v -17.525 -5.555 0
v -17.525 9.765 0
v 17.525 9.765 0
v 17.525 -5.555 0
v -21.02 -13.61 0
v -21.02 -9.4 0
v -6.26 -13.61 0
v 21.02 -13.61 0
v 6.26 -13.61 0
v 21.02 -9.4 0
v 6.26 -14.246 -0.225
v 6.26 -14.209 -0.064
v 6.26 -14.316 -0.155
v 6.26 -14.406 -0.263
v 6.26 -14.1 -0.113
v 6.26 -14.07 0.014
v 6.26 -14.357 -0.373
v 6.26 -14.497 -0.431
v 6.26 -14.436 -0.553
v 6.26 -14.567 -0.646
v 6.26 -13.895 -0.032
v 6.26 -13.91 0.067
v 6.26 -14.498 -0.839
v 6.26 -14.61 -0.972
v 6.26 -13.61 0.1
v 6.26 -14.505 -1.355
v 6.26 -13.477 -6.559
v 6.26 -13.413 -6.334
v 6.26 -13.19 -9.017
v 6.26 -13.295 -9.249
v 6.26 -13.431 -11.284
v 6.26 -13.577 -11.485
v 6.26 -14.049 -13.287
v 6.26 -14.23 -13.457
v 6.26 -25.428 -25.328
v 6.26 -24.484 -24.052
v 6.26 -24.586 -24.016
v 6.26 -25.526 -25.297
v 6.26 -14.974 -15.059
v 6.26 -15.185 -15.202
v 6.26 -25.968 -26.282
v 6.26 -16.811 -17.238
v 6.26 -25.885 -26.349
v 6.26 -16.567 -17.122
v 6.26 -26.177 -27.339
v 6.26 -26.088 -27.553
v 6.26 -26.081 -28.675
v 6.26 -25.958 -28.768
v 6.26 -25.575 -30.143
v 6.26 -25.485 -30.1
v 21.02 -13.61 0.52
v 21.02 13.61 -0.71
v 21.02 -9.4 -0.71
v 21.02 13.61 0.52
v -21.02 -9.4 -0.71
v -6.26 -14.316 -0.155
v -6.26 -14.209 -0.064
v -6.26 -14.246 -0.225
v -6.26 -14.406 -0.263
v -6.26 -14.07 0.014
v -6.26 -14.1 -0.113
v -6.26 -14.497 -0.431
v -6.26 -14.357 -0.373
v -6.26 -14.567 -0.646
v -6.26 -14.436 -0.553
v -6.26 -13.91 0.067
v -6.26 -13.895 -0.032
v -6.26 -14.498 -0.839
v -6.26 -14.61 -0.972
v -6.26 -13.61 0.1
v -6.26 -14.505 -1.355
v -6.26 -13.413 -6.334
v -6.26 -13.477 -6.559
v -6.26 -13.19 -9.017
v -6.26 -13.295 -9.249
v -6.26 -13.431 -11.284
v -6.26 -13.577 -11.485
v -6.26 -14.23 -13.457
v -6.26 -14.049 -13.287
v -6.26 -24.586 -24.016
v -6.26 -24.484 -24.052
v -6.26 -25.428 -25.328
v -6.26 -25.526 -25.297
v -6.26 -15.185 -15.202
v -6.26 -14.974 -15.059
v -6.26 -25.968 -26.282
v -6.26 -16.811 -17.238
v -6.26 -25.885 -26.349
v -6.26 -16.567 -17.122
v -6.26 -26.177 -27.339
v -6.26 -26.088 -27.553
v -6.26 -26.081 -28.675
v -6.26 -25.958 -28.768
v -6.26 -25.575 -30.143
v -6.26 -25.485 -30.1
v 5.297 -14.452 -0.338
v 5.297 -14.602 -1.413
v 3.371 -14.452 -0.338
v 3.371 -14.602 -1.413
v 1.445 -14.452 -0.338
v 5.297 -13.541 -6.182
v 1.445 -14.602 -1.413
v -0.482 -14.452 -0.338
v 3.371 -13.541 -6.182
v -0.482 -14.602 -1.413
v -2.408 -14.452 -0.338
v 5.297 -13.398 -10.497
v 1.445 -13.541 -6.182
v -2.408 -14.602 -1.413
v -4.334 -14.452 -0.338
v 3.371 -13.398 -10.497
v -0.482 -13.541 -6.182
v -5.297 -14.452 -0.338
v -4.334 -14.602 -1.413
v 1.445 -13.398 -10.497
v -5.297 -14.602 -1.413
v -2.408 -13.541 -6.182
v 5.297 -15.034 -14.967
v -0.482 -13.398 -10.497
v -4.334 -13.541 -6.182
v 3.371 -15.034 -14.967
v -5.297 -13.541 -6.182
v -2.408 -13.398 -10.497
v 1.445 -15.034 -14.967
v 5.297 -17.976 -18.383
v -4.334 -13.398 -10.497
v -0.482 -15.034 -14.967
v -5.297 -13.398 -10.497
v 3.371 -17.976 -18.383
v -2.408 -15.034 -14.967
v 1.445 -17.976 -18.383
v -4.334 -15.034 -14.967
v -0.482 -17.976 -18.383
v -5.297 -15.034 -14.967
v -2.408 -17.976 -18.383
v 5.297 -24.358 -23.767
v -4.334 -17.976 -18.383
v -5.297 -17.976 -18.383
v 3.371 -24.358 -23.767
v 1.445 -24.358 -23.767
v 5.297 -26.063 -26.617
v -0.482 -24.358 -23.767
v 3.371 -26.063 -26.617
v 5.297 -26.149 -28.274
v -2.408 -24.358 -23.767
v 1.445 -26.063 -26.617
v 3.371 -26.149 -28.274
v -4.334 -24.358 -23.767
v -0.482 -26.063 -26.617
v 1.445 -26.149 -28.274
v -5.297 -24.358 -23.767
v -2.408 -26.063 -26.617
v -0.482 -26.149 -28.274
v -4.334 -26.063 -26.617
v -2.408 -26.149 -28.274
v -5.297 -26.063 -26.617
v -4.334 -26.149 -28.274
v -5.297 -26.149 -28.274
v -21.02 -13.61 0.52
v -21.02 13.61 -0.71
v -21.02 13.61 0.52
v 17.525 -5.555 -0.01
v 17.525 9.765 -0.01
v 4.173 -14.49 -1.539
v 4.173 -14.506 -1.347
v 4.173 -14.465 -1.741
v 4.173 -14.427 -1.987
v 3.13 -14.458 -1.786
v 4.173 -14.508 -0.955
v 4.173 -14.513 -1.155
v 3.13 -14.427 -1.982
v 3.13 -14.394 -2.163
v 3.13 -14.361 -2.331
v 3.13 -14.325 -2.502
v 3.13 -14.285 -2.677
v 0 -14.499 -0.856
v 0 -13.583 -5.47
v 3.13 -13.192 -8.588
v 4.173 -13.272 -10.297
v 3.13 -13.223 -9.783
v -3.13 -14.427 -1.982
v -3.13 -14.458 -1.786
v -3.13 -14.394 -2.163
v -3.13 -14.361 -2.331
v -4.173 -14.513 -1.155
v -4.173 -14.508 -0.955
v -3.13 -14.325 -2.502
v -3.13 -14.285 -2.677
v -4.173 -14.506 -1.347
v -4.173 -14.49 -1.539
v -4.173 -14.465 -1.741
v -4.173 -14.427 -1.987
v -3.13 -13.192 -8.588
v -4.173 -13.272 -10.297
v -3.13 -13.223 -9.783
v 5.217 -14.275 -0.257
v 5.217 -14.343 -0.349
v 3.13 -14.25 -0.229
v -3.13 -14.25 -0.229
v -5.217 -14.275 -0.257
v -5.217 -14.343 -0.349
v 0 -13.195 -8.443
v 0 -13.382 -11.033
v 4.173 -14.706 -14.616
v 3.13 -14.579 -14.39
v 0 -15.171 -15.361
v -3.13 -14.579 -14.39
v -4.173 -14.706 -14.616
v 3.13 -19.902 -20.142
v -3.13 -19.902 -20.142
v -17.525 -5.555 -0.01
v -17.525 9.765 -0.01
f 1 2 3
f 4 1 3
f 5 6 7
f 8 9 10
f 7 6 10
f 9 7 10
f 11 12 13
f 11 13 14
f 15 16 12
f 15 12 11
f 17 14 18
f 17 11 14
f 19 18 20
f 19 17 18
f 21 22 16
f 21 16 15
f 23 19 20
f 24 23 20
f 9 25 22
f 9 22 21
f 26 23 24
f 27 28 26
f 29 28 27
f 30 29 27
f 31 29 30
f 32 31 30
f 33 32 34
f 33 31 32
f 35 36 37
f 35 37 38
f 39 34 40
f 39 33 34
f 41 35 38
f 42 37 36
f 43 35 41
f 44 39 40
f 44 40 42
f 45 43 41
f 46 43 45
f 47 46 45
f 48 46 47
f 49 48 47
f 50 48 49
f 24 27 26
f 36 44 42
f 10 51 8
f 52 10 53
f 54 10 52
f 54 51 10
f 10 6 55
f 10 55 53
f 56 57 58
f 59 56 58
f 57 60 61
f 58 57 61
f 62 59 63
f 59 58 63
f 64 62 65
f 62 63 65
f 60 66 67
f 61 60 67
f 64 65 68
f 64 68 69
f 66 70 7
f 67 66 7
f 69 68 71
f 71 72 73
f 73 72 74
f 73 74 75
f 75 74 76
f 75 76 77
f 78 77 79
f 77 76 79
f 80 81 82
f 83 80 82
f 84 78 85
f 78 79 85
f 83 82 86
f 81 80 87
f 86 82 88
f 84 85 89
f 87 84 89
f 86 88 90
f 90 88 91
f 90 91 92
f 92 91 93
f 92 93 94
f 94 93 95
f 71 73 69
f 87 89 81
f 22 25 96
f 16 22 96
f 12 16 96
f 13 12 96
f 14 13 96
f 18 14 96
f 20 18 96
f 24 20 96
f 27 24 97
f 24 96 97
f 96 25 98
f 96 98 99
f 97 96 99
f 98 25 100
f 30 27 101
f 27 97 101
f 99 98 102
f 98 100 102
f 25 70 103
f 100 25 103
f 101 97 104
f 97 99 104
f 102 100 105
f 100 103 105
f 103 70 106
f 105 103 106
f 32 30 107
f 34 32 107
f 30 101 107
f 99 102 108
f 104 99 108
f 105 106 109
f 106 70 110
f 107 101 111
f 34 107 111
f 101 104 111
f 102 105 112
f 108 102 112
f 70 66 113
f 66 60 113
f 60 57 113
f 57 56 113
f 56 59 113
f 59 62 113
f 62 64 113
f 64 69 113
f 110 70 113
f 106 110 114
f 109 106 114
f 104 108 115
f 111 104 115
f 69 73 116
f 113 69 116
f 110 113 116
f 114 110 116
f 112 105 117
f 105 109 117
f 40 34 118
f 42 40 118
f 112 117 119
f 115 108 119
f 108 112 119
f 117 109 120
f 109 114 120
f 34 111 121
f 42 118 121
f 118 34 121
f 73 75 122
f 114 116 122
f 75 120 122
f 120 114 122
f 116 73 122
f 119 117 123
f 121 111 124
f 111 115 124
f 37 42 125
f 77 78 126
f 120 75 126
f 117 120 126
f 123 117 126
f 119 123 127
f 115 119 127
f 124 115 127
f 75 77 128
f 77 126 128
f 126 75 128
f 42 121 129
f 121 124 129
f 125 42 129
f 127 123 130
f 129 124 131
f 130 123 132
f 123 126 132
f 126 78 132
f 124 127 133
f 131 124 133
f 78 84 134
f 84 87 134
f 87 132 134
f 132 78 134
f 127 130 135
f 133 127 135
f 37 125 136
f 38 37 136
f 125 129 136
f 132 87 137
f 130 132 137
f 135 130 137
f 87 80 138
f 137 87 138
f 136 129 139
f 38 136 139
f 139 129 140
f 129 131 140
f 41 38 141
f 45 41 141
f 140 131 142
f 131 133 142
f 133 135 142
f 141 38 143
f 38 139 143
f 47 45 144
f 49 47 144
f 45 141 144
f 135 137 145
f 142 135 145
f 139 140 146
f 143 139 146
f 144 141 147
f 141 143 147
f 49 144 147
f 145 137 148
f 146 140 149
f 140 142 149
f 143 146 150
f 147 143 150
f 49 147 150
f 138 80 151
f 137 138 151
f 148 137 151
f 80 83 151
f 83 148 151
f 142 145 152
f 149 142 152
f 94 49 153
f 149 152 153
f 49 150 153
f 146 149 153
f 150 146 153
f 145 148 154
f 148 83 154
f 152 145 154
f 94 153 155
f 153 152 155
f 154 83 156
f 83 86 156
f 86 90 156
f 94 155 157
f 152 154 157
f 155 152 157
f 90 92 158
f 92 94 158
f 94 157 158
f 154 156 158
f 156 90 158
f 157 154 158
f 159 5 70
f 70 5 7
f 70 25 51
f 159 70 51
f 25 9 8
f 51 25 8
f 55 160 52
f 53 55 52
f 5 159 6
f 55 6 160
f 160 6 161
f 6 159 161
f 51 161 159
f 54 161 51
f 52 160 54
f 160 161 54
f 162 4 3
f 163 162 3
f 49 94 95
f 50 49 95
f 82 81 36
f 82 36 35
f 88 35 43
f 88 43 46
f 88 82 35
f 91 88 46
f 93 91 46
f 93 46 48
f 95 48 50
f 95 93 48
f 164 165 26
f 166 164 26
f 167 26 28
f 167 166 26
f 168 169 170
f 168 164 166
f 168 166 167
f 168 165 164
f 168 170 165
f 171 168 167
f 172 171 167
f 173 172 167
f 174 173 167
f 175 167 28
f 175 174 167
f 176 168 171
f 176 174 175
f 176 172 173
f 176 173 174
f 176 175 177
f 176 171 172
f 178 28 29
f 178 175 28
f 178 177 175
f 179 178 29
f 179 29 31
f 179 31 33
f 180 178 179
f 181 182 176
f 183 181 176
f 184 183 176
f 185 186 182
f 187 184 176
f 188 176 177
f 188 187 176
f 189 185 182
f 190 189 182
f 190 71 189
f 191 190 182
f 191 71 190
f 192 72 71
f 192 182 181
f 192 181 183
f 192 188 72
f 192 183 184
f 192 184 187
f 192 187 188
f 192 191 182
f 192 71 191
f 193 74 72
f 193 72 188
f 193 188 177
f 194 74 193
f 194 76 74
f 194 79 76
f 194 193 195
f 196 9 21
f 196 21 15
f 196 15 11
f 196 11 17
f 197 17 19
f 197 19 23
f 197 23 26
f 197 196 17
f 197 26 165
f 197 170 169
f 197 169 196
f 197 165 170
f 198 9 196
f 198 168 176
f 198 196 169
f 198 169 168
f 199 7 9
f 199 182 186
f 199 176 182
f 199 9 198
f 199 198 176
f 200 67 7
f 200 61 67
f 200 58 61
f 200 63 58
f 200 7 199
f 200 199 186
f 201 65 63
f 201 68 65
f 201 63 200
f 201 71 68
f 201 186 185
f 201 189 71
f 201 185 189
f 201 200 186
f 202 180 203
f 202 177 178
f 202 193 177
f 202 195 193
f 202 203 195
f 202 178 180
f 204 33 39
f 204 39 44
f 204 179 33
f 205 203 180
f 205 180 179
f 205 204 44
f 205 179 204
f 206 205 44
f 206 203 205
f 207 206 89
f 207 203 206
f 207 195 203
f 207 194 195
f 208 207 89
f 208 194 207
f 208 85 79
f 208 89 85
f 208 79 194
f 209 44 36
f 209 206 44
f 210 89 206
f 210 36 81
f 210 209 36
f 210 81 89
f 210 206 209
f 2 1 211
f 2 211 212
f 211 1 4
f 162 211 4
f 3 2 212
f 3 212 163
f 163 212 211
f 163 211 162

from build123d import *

# Parameters (mm, degrees)
SKETCH_1_W          = 42.04
SKETCH_1_H          = 27.22
EXTRUDE_1_DEPTH     = 0.52
SKETCH_3_W          = 42.04
SKETCH_3_H          = 23.01
EXTRUDE_2_DEPTH     = 0.71
SKETCH_5_W          = 35.05
SKETCH_5_H          = 15.32
CUT_EXTRUDE_1_DEPTH = 0.01
EXTRUDE_START       = -6.26
EXTRUDE_1_2_DEPTH   = 12.52


# Read off the part's stored shape, not the designer's step: 拉伸-薄壁1
with BuildPart() as part:
    # 草图1 → Extrude 1 (new body)
    with BuildSketch(Plane.XY):
        Rectangle(SKETCH_1_W, SKETCH_1_H)
    extrude(amount=EXTRUDE_1_DEPTH)

    # 草图3 → 凸台-拉伸2 (add)
    with BuildSketch(Plane.XY):
        with Locations((0, 2.105)):
            Rectangle(SKETCH_3_W, SKETCH_3_H)
    extrude(amount=-EXTRUDE_2_DEPTH)

    # 草图5 → 切除-拉伸1 (cut)
    with BuildSketch(Plane.XY):
        with Locations((0, 2.105)):
            Rectangle(SKETCH_5_W, SKETCH_5_H)
    extrude(amount=-CUT_EXTRUDE_1_DEPTH, mode=Mode.SUBTRACT)

    # Extrude 1 2 outline → Extrude 1 2 (add)
    with BuildSketch(Plane(origin=(0, 0, 0), x_dir=(0, 0, -1), z_dir=(1, 0, 0)).offset(EXTRUDE_START)):
        with BuildLine():
            Line((0, -13.61), (-0.1, -13.61))
            add(Edge.make_bspline(
                [(-0.1, -13.61), (-0.1, -13.811999948), (-0.062447397, -13.983759134), (0.087597414, -14.266880112), (0.200229868, -14.375905512), (0.61293299, -14.604541747), (0.98162629, -14.634564325), (2.275338874, -14.53538179), (3.401387146, -14.206264697), (4.808904257, -13.842712132), (5.090182683, -13.77233657), (5.643385338, -13.645546605), (5.91499808, -13.589621122), (6.715455086, -13.444072044), (7.229865116, -13.376385405), (8.718879461, -13.254443705), (9.639245367, -13.281281386), (12.212088444, -13.631316764), (13.676832265, -14.22370802), (16.256955878, -15.84390487), (17.371964057, -16.872230984), (20.403860489, -20.184886502), (22.003130479, -22.695949544), (24.648389829, -25.189380489), (25.574110216, -25.809694734), (27.660843497, -26.317217871), (28.817134045, -26.200070844), (30.142790661, -25.575336117)],
                knots=[0, 0, 0, 0, 0.015625, 0.015625, 0.03125, 0.03125, 0.0625, 0.0625, 0.125, 0.125, 0.140625, 0.140625, 0.15625, 0.15625, 0.1875, 0.1875, 0.25, 0.25, 0.375, 0.375, 0.5, 0.5, 0.75, 0.75, 0.875, 0.875, 1, 1, 1, 1], degree=3))
            Line((30.142790661, -25.575336117), (30.100160891, -25.484877824))
            add(Edge.make_bspline(
                [(0, -13.61), (0, -15.345647415), (20.557920243, -6.954998075), (21.119775691, -29.717013379), (30.100160891, -25.484877824)],
                knots=[0, 0, 0, 0, 0.142988606, 1, 1, 1, 1], degree=3))
        make_face()
    extrude(amount=EXTRUDE_1_2_DEPTH)


solid = part.part
